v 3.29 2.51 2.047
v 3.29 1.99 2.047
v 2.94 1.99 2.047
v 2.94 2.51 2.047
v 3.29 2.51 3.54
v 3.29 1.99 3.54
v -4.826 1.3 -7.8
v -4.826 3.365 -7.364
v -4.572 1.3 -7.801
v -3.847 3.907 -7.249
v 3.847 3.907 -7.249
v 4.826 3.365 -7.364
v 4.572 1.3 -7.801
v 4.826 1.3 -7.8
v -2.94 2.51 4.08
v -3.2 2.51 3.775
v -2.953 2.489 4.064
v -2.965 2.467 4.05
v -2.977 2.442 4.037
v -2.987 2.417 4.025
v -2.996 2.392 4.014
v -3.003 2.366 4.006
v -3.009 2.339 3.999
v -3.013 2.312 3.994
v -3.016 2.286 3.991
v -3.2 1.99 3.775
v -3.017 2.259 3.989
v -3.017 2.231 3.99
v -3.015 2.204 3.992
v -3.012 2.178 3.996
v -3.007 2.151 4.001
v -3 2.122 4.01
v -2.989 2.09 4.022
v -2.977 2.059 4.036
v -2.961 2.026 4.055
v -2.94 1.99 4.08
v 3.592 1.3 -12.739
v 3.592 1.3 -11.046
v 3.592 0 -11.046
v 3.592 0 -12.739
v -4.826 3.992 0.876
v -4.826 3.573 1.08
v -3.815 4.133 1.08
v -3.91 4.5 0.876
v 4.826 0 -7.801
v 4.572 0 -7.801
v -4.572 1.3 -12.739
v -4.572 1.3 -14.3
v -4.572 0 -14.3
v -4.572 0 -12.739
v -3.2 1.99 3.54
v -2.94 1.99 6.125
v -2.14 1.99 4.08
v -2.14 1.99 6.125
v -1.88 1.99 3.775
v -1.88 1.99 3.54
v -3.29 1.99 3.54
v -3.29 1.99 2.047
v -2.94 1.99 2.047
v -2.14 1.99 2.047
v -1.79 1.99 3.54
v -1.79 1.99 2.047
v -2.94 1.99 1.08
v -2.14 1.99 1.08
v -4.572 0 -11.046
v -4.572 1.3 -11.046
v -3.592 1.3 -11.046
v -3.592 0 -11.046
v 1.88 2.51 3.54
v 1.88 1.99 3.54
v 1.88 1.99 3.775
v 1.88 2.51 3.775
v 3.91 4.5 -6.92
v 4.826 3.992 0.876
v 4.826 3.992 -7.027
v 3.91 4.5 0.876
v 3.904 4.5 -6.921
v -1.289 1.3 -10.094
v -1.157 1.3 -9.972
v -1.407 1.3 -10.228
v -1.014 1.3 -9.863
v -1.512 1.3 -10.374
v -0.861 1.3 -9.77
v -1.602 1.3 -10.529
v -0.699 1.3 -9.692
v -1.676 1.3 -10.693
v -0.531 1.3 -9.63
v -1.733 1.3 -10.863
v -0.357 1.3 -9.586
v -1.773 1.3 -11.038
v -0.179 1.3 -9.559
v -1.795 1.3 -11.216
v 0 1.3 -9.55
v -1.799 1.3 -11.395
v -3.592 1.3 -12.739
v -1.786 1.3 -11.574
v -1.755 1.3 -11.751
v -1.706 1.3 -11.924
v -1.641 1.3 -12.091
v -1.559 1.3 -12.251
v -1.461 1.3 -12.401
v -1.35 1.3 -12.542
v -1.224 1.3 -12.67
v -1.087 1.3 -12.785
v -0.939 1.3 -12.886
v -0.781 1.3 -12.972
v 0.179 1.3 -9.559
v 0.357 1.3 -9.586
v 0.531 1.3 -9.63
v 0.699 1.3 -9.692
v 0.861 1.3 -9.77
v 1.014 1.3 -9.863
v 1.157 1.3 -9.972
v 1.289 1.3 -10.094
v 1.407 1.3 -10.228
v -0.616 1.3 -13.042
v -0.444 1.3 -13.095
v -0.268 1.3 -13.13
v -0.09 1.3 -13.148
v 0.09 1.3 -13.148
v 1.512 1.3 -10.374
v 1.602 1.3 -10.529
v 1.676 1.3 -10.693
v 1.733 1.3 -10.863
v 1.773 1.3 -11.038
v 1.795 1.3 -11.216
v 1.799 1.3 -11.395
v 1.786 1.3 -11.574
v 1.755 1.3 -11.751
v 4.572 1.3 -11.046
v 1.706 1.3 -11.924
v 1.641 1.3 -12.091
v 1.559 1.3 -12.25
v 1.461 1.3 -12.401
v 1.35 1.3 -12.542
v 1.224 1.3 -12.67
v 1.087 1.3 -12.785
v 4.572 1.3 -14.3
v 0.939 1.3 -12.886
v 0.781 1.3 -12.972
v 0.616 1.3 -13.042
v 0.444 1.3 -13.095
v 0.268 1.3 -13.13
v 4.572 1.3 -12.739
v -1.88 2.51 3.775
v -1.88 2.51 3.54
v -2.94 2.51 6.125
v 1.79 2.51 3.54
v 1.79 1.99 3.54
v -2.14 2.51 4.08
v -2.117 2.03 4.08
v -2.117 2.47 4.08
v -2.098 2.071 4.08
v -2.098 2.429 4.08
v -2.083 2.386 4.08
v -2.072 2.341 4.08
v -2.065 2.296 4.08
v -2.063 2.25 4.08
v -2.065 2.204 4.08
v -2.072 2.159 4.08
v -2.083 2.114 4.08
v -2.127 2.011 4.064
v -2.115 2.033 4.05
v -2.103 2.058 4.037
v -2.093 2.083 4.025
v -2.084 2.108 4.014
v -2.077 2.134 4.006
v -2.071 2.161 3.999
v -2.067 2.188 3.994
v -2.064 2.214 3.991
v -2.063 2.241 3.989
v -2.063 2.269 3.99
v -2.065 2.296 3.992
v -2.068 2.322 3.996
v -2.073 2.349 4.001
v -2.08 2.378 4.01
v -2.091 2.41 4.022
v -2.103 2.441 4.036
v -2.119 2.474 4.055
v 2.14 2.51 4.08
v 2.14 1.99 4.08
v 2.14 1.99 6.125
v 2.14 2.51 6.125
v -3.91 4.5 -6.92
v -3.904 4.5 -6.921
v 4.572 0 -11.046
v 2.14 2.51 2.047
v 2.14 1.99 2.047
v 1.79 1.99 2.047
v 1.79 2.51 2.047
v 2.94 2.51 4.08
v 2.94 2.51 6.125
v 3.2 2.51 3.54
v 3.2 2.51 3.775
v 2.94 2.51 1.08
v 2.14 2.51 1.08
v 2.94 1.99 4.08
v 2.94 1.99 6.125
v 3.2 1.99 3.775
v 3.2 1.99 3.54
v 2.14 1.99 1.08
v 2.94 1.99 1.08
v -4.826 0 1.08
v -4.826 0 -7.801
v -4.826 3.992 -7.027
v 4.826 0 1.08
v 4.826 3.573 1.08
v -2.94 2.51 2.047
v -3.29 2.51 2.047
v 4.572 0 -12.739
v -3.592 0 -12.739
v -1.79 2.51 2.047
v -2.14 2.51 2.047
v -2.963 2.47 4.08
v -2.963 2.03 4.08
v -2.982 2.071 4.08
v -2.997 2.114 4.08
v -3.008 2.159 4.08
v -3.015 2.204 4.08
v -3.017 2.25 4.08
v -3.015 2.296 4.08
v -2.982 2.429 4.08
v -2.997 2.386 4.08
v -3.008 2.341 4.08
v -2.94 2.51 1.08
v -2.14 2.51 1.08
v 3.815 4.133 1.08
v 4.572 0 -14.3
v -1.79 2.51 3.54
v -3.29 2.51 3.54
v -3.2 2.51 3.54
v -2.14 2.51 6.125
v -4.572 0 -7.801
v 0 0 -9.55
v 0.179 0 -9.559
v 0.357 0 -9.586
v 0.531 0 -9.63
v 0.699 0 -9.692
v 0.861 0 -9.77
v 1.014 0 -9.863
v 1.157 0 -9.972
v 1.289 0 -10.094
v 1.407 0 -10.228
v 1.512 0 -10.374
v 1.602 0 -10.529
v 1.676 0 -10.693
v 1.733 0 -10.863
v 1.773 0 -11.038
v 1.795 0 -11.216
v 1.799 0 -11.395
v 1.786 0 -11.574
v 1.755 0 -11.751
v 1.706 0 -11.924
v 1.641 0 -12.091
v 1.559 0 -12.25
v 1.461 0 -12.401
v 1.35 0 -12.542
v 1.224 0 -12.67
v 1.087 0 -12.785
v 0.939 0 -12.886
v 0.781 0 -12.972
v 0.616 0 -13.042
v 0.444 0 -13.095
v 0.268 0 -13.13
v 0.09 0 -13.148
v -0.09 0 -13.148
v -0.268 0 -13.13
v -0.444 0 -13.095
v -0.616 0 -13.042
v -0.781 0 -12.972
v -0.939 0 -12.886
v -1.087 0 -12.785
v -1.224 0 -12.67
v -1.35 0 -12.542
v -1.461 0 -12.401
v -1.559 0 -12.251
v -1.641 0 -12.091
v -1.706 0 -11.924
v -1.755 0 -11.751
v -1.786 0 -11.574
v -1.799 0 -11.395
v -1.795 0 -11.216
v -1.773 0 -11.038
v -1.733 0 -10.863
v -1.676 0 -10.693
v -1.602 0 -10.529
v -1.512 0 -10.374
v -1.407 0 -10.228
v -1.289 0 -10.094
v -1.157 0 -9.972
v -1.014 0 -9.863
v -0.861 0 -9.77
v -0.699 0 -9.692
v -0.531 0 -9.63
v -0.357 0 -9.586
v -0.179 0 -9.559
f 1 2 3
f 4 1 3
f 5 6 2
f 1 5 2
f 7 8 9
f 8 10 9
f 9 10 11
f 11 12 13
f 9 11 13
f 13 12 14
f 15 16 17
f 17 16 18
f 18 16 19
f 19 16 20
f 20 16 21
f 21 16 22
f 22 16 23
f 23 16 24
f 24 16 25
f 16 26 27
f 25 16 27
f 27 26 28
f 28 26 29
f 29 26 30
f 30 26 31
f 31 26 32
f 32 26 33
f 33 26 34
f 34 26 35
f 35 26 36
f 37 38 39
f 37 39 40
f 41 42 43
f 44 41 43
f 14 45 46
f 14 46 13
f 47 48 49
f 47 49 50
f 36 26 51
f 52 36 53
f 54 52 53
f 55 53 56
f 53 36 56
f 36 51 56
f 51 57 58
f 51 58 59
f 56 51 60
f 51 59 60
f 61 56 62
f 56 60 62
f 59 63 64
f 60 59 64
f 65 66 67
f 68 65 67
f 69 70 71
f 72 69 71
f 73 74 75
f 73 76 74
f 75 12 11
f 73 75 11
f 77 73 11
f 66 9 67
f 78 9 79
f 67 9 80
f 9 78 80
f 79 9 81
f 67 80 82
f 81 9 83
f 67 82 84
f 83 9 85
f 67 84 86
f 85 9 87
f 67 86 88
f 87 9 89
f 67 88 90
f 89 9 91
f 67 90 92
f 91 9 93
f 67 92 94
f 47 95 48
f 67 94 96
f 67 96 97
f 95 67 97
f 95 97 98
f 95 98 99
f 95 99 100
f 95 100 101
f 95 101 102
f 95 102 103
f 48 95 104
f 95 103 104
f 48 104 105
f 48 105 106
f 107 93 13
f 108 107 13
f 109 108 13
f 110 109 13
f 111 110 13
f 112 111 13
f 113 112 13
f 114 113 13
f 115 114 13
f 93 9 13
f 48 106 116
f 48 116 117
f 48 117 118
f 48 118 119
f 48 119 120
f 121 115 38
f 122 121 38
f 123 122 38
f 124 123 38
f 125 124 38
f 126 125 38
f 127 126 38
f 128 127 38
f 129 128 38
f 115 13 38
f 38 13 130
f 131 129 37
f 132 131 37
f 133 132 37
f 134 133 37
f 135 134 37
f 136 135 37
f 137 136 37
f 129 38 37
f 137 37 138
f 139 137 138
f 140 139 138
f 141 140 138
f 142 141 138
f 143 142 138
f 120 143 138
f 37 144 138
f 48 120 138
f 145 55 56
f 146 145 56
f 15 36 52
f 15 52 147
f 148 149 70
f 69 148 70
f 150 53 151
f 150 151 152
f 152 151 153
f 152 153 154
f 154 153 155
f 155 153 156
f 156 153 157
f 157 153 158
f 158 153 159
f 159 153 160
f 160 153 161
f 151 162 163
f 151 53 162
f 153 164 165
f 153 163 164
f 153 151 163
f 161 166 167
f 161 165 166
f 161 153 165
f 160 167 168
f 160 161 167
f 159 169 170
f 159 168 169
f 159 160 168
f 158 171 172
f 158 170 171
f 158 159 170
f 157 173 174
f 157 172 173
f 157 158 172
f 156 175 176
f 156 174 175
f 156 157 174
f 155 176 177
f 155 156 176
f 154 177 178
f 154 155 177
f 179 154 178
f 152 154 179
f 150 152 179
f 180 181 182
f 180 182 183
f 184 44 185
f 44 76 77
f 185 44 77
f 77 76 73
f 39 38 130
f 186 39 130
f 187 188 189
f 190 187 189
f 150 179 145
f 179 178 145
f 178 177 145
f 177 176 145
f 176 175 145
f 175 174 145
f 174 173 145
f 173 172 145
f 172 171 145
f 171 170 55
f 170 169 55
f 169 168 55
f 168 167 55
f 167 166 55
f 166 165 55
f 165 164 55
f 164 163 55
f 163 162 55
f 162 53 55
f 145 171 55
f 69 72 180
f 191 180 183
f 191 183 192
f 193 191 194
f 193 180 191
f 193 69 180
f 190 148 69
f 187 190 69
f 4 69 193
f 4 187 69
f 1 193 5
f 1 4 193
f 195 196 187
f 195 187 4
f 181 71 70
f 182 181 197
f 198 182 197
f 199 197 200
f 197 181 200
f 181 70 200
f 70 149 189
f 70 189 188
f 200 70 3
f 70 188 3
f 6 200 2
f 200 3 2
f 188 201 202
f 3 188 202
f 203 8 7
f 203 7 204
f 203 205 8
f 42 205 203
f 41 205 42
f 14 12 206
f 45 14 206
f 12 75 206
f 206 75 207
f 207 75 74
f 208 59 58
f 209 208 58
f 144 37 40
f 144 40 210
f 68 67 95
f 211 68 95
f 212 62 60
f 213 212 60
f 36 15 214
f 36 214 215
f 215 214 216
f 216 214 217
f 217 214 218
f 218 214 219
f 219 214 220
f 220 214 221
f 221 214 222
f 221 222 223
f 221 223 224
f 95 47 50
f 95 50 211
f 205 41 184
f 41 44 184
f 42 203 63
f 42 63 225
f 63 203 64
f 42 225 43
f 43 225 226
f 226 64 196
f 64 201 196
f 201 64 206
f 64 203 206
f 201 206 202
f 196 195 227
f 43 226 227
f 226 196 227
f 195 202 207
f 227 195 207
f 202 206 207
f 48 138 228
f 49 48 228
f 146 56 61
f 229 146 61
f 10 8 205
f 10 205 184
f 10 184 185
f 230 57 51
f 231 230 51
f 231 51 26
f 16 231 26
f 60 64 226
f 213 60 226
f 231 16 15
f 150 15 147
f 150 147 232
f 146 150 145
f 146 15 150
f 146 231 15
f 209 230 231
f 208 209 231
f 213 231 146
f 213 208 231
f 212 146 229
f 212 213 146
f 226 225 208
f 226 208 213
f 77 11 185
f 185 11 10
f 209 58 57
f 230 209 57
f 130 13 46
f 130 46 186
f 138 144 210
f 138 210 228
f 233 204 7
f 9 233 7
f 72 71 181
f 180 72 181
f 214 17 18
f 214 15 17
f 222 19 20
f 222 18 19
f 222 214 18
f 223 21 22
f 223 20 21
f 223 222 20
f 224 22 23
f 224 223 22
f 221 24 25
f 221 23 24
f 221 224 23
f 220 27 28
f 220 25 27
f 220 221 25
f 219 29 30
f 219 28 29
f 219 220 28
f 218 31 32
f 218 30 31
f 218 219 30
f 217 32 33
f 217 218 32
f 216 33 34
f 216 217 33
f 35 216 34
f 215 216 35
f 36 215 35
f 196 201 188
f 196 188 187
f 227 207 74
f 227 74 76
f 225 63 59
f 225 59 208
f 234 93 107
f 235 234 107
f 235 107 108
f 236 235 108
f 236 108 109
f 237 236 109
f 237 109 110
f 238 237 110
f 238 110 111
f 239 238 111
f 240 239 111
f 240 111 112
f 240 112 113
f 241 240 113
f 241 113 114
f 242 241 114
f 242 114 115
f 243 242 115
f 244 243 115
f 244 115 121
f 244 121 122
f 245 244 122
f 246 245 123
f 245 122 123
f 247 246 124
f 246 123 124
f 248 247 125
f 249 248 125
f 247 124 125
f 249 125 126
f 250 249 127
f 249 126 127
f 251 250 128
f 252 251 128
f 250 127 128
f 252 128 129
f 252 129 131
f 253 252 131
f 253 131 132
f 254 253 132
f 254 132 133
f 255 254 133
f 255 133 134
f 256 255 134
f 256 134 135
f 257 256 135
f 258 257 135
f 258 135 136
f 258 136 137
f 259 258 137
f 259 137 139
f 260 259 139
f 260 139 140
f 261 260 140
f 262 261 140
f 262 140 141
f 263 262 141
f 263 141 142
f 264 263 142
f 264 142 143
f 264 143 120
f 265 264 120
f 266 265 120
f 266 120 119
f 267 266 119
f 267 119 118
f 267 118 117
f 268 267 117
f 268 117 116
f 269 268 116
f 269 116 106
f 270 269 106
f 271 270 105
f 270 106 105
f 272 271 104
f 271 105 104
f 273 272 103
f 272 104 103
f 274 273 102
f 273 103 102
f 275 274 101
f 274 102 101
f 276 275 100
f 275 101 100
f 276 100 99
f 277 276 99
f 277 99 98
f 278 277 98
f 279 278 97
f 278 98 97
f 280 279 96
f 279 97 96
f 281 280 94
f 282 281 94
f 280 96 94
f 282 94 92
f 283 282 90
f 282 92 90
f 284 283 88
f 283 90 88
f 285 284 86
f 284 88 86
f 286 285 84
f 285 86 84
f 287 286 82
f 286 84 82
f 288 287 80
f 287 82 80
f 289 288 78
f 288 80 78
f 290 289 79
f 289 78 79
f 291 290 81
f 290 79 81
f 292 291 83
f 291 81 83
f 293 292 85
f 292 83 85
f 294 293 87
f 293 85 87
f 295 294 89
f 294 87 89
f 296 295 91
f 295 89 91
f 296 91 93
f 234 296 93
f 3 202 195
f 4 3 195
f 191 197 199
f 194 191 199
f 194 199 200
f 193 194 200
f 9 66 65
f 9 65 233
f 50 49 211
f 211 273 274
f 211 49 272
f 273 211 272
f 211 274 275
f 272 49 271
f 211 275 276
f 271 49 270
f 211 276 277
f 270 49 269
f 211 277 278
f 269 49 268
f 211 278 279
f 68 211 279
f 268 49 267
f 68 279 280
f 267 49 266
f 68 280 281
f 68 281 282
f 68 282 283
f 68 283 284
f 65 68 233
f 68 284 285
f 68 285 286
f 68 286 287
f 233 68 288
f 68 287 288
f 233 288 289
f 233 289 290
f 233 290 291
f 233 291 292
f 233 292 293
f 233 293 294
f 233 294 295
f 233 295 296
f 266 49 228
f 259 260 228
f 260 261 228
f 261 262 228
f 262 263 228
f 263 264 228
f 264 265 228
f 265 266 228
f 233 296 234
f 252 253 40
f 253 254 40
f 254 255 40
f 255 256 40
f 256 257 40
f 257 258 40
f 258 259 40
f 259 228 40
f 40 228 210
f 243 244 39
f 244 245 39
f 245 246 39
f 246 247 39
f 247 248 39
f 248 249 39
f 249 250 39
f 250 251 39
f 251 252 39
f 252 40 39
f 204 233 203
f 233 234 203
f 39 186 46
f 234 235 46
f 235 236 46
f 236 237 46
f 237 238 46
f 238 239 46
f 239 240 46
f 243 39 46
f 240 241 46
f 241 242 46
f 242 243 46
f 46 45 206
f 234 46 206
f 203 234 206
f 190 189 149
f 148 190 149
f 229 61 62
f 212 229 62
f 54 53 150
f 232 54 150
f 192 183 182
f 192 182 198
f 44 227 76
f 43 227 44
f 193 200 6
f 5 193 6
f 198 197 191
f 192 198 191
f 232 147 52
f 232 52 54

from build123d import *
from OCP.BRepFilletAPI import BRepFilletAPI_MakeChamfer

# Parameters (mm, degrees)
EXTRUDE1_DEPTH        = 4.826
EXTRUDE1_DEPTH_BACK   = 4.826
SKETCH10_R            = 1.8
SKETCH10_W            = 1.233836604
SKETCH10_H            = 1.6931216
EXTRUDE5_DEPTH        = 16.428369203
SKETCH6_W             = 0.8
SKETCH6_H             = 0.52
EXTRUDE6_DEPTH        = 13
EXTRUDE7_START        = -0.52
EXTRUDE7_DEPTH        = 0.52
CHAMFER1_SIZE         = 0.254
SKETCH12_W            = 7.379682426
SKETCH12_H            = 2.736118788
EXTRUDE8_DEPTH        = 0.254
SKETCH13_W            = 7.379682426
SKETCH13_H            = 2.736118788
EXTRUDE9_DEPTH        = 0.254
CHAMFER2_SIZE         = 0.508
CHAMFER2_SIZE2        = 0.91645626
CHAMFER3_SIZE         = 0.2032
CHAMFER3_SIZE2        = 0.366582504
CHAMFER3_SIZE2_2      = 0.605677555
CHAMFER3_SIZE2_3      = 0.557834937
EXTRUDE10_DEPTH       = 1.016
ESBO_O1_W             = 2.508369598
ESBO_O1_H             = 14.0227971
CORTE_EXTRUS_O1_DEPTH = 2.54
SKETCH17_W            = 14.984360746
SKETCH17_H            = 12.426120952
CUT_EXTRUDE1_DEPTH    = 22.464410101


with BuildPart() as part:
    # Sketch2 → Extrude1 (new, two sides)
    with BuildSketch(Plane(origin=(0, 0, 0), x_dir=(0, 0, -1), z_dir=(1, 0, 0))) as extrude1_sk:
        Polygon((14.3005, 0), (-1.0795, 0), (-1.0795, 4.5), (7.124012877, 4.5), (7.8005, 1.3), (14.3005, 1.3), align=None)
    extrude(amount=EXTRUDE1_DEPTH)
    extrude(extrude1_sk.sketch, amount=-EXTRUDE1_DEPTH_BACK)

    # Sketch10 → Extrude5 (cut, through all)
    with BuildSketch(Plane(origin=(0, 1.3, 0), x_dir=(1, 0, 0), z_dir=(0, 1, 0))):
        with Locations(Location((0, 11.3505, 0), (0, 0, 270))):
            Circle(SKETCH10_R)
        with Locations((-4.209081698, 11.892729701)):
            Rectangle(SKETCH10_W, SKETCH10_H)
        with Locations((4.209081698, 11.892729701)):
            Rectangle(SKETCH10_W, SKETCH10_H)
    extrude(amount=-EXTRUDE5_DEPTH, mode=Mode.SUBTRACT)

    # Sketch6 → Extrude6 (add)
    with BuildSketch(Plane.XY.offset(1.0795)):
        with Locations((2.54, 2.25)):
            Rectangle(SKETCH6_W, SKETCH6_H)
        with Locations((-2.54, 2.25)):
            Rectangle(SKETCH6_W, SKETCH6_H)
        with Locations((0, 2.25)):
            Rectangle(SKETCH6_W, SKETCH6_H)
    extrude(amount=EXTRUDE6_DEPTH)

    # Sketch11 → Extrude7 (add)
    with BuildSketch(Plane(origin=(0, 2.51, 0), x_dir=(1, 0, 0), z_dir=(0, 1, 0)).offset(EXTRUDE7_START)):
        Polygon((-2.94, -2.0475), (-3.29, -2.0475), (-3.29, -3.5395), (-3.2004, -3.5395), (-3.2004, -3.7747), (-2.94, -4.0795), align=None)
        Polygon((-1.79, -2.0475), (-2.14, -2.0475), (-2.14, -4.0795), (-1.8796, -3.7747), (-1.8796, -3.5395), (-1.79, -3.5395), align=None)
        Polygon((-0.4, -2.0475), (-0.75, -2.0475), (-0.75, -3.5395), (-0.6604, -3.5395), (-0.6604, -3.7747), (-0.4, -4.0795), align=None)
        Polygon((0.75, -2.0475), (0.4, -2.0475), (0.4, -4.0795), (0.6604, -3.7747), (0.6604, -3.5395), (0.75, -3.5395), align=None)
        Polygon((2.14, -2.0475), (1.79, -2.0475), (1.79, -3.5395), (1.8796, -3.5395), (1.8796, -3.7747), (2.14, -4.0795), align=None)
        Polygon((3.29, -2.0475), (2.94, -2.0475), (2.94, -4.0795), (3.2004, -3.7747), (3.2004, -3.5395), (3.29, -3.5395), align=None)
    extrude(amount=EXTRUDE7_DEPTH)

    # Chamfer1
    chamfer1_edges = [part.edges().sort_by_distance(p)[0] for p in [
        (-2.14, 2.25, 14.0795),
        (-2.94, 2.25, 14.0795),
        (2.94, 2.25, 14.0795),
        (2.14, 2.25, 14.0795),
        (0.4, 2.25, 14.0795),
        (-0.4, 2.25, 14.0795),
    ]]
    chamfer(chamfer1_edges, length=CHAMFER1_SIZE)

    # Sketch12 → Extrude8 (cut)
    with BuildSketch(Plane.ZY.offset(4.826)):
        with Locations((-11.490341213, 1.368059394)):
            Rectangle(SKETCH12_W, SKETCH12_H)
    extrude(amount=-EXTRUDE8_DEPTH, mode=Mode.SUBTRACT)

    # Sketch13 → Extrude9 (cut)
    with BuildSketch(Plane(origin=(4.826, 0, 0), x_dir=(0, 0, -1), z_dir=(1, 0, 0))):
        with Locations((11.490341213, 1.368059394)):
            Rectangle(SKETCH13_W, SKETCH13_H)
    extrude(amount=-EXTRUDE9_DEPTH, mode=Mode.SUBTRACT)

    # Chamfer2: one chamfer whose edges measure the first distance from different faces: ONE call of the kernel's chamfer builder (chamfer() names one face for all edges)
    chamfer2_edges_1 = [part.edges().sort_by_distance(p)[0] for p in [
        (-4.826, 4.5, -3.022256439),
    ]]
    chamfer2_side_1 = [part.faces().sort_by_distance(p)[0] for p in [
        (-4.826, 2.217055195, -3.243165334),
    ]]
    chamfer2_edges_2 = [part.edges().sort_by_distance(p)[0] for p in [
        (4.826, 4.5, -3.022256439),
    ]]
    chamfer2_side_2 = [part.faces().sort_by_distance(p)[0] for p in [
        (4.826, 2.217055195, -3.243165334),
    ]]
    chamfer2 = BRepFilletAPI_MakeChamfer(part.part.solid().wrapped)
    for e in chamfer2_edges_1:
        chamfer2.Add(CHAMFER2_SIZE, CHAMFER2_SIZE2, e.wrapped, chamfer2_side_1[0].wrapped)  # the first distance lies on this face
    for e in chamfer2_edges_2:
        chamfer2.Add(CHAMFER2_SIZE, CHAMFER2_SIZE2, e.wrapped, chamfer2_side_2[0].wrapped)  # the first distance lies on this face
    add(Compound.cast(chamfer2.Shape()), mode=Mode.REPLACE)

    # Chamfer3: one chamfer whose edges measure the first distance from different faces: ONE call of the kernel's chamfer builder (chamfer() names one face for all edges)
    chamfer3_edges_1 = [part.edges().sort_by_distance(p)[0] for p in [
        (0, 4.5, 1.0795),
    ]]
    chamfer3_side_1 = [part.faces().sort_by_distance(p)[0] for p in [
        (0, 4.5, -3.022256439),
    ]]
    chamfer3_edges_2 = [part.edges().sort_by_distance(p)[0] for p in [
        (-4.36777187, 4.246, 1.0795),
    ]]
    chamfer3_side_2 = [part.faces().sort_by_distance(p)[0] for p in [
        (-4.368765147, 4.245449417, -3.049162718),
    ]]
    chamfer3_edges_3 = [part.edges().sort_by_distance(p)[0] for p in [
        (4.36777187, 4.246, 1.0795),
    ]]
    chamfer3_side_3 = [part.faces().sort_by_distance(p)[0] for p in [
        (4.368765147, 4.245449417, -3.049162718),
    ]]
    chamfer3_edges_4 = [part.edges().sort_by_distance(p)[0] for p in [
        (0, 4.5, -7.124012877),
    ]]
    chamfer3_side_4 = [part.faces().sort_by_distance(p)[0] for p in [
        (0, 4.5, -3.022256439),
    ]]
    chamfer3_edges_5 = [part.edges().sort_by_distance(p)[0] for p in [
        (-4.36777187, 4.246, -7.177709043),
    ]]
    chamfer3_side_5 = [part.faces().sort_by_distance(p)[0] for p in [
        (-4.368765147, 4.245449417, -3.049162718),
    ]]
    chamfer3_edges_6 = [part.edges().sort_by_distance(p)[0] for p in [
        (4.36777187, 4.246, -7.177709043),
    ]]
    chamfer3_side_6 = [part.faces().sort_by_distance(p)[0] for p in [
        (4.368765147, 4.245449417, -3.049162718),
    ]]
    chamfer3 = BRepFilletAPI_MakeChamfer(part.part.solid().wrapped)
    for e in chamfer3_edges_1:
        chamfer3.Add(CHAMFER3_SIZE, CHAMFER3_SIZE2, e.wrapped, chamfer3_side_1[0].wrapped)  # the first distance lies on this face
    for e in chamfer3_edges_2:
        chamfer3.Add(CHAMFER3_SIZE, CHAMFER3_SIZE2, e.wrapped, chamfer3_side_2[0].wrapped)  # the first distance lies on this face
    for e in chamfer3_edges_3:
        chamfer3.Add(CHAMFER3_SIZE, CHAMFER3_SIZE2, e.wrapped, chamfer3_side_3[0].wrapped)  # the first distance lies on this face
    for e in chamfer3_edges_4:
        chamfer3.Add(CHAMFER3_SIZE, CHAMFER3_SIZE2_2, e.wrapped, chamfer3_side_4[0].wrapped)  # the first distance lies on this face
    for e in chamfer3_edges_5:
        chamfer3.Add(CHAMFER3_SIZE, CHAMFER3_SIZE2_3, e.wrapped, chamfer3_side_5[0].wrapped)  # the first distance lies on this face
    for e in chamfer3_edges_6:
        chamfer3.Add(CHAMFER3_SIZE, CHAMFER3_SIZE2_3, e.wrapped, chamfer3_side_6[0].wrapped)  # the first distance lies on this face
    add(Compound.cast(chamfer3.Shape()), mode=Mode.REPLACE)

    # Sketch15 → Extrude10 (add)
    with BuildSketch(Plane.XY.offset(4.0795)):
        with BuildLine():
            Line((-2.14, 2.51), (-2.94, 2.51))
            ThreePointArc((-2.94, 2.51), (-3.017074418, 2.25), (-2.94, 1.99))
            Line((-2.94, 1.99), (-2.14, 1.99))
            ThreePointArc((-2.14, 1.99), (-2.062925582, 2.25), (-2.14, 2.51))
        make_face()
    extrude(amount=-EXTRUDE10_DEPTH)

    # Esboço1 → Corte-extrusão1 (cut)
    with BuildSketch(Plane(origin=(0, 2.51, 0), x_dir=(1, 0, 0), z_dir=(0, 1, 0))):
        with Locations((0.046451289, -8.09089855)):
            Rectangle(ESBO_O1_W, ESBO_O1_H)
    extrude(amount=-CORTE_EXTRUS_O1_DEPTH, mode=Mode.SUBTRACT)

    # Sketch17 → Cut-Extrude1 (cut, through all)
    with BuildSketch(Plane.XY.offset(6.1245)):
        Rectangle(SKETCH17_W, SKETCH17_H)
    extrude(amount=CUT_EXTRUDE1_DEPTH, mode=Mode.SUBTRACT)


solid = part.part
